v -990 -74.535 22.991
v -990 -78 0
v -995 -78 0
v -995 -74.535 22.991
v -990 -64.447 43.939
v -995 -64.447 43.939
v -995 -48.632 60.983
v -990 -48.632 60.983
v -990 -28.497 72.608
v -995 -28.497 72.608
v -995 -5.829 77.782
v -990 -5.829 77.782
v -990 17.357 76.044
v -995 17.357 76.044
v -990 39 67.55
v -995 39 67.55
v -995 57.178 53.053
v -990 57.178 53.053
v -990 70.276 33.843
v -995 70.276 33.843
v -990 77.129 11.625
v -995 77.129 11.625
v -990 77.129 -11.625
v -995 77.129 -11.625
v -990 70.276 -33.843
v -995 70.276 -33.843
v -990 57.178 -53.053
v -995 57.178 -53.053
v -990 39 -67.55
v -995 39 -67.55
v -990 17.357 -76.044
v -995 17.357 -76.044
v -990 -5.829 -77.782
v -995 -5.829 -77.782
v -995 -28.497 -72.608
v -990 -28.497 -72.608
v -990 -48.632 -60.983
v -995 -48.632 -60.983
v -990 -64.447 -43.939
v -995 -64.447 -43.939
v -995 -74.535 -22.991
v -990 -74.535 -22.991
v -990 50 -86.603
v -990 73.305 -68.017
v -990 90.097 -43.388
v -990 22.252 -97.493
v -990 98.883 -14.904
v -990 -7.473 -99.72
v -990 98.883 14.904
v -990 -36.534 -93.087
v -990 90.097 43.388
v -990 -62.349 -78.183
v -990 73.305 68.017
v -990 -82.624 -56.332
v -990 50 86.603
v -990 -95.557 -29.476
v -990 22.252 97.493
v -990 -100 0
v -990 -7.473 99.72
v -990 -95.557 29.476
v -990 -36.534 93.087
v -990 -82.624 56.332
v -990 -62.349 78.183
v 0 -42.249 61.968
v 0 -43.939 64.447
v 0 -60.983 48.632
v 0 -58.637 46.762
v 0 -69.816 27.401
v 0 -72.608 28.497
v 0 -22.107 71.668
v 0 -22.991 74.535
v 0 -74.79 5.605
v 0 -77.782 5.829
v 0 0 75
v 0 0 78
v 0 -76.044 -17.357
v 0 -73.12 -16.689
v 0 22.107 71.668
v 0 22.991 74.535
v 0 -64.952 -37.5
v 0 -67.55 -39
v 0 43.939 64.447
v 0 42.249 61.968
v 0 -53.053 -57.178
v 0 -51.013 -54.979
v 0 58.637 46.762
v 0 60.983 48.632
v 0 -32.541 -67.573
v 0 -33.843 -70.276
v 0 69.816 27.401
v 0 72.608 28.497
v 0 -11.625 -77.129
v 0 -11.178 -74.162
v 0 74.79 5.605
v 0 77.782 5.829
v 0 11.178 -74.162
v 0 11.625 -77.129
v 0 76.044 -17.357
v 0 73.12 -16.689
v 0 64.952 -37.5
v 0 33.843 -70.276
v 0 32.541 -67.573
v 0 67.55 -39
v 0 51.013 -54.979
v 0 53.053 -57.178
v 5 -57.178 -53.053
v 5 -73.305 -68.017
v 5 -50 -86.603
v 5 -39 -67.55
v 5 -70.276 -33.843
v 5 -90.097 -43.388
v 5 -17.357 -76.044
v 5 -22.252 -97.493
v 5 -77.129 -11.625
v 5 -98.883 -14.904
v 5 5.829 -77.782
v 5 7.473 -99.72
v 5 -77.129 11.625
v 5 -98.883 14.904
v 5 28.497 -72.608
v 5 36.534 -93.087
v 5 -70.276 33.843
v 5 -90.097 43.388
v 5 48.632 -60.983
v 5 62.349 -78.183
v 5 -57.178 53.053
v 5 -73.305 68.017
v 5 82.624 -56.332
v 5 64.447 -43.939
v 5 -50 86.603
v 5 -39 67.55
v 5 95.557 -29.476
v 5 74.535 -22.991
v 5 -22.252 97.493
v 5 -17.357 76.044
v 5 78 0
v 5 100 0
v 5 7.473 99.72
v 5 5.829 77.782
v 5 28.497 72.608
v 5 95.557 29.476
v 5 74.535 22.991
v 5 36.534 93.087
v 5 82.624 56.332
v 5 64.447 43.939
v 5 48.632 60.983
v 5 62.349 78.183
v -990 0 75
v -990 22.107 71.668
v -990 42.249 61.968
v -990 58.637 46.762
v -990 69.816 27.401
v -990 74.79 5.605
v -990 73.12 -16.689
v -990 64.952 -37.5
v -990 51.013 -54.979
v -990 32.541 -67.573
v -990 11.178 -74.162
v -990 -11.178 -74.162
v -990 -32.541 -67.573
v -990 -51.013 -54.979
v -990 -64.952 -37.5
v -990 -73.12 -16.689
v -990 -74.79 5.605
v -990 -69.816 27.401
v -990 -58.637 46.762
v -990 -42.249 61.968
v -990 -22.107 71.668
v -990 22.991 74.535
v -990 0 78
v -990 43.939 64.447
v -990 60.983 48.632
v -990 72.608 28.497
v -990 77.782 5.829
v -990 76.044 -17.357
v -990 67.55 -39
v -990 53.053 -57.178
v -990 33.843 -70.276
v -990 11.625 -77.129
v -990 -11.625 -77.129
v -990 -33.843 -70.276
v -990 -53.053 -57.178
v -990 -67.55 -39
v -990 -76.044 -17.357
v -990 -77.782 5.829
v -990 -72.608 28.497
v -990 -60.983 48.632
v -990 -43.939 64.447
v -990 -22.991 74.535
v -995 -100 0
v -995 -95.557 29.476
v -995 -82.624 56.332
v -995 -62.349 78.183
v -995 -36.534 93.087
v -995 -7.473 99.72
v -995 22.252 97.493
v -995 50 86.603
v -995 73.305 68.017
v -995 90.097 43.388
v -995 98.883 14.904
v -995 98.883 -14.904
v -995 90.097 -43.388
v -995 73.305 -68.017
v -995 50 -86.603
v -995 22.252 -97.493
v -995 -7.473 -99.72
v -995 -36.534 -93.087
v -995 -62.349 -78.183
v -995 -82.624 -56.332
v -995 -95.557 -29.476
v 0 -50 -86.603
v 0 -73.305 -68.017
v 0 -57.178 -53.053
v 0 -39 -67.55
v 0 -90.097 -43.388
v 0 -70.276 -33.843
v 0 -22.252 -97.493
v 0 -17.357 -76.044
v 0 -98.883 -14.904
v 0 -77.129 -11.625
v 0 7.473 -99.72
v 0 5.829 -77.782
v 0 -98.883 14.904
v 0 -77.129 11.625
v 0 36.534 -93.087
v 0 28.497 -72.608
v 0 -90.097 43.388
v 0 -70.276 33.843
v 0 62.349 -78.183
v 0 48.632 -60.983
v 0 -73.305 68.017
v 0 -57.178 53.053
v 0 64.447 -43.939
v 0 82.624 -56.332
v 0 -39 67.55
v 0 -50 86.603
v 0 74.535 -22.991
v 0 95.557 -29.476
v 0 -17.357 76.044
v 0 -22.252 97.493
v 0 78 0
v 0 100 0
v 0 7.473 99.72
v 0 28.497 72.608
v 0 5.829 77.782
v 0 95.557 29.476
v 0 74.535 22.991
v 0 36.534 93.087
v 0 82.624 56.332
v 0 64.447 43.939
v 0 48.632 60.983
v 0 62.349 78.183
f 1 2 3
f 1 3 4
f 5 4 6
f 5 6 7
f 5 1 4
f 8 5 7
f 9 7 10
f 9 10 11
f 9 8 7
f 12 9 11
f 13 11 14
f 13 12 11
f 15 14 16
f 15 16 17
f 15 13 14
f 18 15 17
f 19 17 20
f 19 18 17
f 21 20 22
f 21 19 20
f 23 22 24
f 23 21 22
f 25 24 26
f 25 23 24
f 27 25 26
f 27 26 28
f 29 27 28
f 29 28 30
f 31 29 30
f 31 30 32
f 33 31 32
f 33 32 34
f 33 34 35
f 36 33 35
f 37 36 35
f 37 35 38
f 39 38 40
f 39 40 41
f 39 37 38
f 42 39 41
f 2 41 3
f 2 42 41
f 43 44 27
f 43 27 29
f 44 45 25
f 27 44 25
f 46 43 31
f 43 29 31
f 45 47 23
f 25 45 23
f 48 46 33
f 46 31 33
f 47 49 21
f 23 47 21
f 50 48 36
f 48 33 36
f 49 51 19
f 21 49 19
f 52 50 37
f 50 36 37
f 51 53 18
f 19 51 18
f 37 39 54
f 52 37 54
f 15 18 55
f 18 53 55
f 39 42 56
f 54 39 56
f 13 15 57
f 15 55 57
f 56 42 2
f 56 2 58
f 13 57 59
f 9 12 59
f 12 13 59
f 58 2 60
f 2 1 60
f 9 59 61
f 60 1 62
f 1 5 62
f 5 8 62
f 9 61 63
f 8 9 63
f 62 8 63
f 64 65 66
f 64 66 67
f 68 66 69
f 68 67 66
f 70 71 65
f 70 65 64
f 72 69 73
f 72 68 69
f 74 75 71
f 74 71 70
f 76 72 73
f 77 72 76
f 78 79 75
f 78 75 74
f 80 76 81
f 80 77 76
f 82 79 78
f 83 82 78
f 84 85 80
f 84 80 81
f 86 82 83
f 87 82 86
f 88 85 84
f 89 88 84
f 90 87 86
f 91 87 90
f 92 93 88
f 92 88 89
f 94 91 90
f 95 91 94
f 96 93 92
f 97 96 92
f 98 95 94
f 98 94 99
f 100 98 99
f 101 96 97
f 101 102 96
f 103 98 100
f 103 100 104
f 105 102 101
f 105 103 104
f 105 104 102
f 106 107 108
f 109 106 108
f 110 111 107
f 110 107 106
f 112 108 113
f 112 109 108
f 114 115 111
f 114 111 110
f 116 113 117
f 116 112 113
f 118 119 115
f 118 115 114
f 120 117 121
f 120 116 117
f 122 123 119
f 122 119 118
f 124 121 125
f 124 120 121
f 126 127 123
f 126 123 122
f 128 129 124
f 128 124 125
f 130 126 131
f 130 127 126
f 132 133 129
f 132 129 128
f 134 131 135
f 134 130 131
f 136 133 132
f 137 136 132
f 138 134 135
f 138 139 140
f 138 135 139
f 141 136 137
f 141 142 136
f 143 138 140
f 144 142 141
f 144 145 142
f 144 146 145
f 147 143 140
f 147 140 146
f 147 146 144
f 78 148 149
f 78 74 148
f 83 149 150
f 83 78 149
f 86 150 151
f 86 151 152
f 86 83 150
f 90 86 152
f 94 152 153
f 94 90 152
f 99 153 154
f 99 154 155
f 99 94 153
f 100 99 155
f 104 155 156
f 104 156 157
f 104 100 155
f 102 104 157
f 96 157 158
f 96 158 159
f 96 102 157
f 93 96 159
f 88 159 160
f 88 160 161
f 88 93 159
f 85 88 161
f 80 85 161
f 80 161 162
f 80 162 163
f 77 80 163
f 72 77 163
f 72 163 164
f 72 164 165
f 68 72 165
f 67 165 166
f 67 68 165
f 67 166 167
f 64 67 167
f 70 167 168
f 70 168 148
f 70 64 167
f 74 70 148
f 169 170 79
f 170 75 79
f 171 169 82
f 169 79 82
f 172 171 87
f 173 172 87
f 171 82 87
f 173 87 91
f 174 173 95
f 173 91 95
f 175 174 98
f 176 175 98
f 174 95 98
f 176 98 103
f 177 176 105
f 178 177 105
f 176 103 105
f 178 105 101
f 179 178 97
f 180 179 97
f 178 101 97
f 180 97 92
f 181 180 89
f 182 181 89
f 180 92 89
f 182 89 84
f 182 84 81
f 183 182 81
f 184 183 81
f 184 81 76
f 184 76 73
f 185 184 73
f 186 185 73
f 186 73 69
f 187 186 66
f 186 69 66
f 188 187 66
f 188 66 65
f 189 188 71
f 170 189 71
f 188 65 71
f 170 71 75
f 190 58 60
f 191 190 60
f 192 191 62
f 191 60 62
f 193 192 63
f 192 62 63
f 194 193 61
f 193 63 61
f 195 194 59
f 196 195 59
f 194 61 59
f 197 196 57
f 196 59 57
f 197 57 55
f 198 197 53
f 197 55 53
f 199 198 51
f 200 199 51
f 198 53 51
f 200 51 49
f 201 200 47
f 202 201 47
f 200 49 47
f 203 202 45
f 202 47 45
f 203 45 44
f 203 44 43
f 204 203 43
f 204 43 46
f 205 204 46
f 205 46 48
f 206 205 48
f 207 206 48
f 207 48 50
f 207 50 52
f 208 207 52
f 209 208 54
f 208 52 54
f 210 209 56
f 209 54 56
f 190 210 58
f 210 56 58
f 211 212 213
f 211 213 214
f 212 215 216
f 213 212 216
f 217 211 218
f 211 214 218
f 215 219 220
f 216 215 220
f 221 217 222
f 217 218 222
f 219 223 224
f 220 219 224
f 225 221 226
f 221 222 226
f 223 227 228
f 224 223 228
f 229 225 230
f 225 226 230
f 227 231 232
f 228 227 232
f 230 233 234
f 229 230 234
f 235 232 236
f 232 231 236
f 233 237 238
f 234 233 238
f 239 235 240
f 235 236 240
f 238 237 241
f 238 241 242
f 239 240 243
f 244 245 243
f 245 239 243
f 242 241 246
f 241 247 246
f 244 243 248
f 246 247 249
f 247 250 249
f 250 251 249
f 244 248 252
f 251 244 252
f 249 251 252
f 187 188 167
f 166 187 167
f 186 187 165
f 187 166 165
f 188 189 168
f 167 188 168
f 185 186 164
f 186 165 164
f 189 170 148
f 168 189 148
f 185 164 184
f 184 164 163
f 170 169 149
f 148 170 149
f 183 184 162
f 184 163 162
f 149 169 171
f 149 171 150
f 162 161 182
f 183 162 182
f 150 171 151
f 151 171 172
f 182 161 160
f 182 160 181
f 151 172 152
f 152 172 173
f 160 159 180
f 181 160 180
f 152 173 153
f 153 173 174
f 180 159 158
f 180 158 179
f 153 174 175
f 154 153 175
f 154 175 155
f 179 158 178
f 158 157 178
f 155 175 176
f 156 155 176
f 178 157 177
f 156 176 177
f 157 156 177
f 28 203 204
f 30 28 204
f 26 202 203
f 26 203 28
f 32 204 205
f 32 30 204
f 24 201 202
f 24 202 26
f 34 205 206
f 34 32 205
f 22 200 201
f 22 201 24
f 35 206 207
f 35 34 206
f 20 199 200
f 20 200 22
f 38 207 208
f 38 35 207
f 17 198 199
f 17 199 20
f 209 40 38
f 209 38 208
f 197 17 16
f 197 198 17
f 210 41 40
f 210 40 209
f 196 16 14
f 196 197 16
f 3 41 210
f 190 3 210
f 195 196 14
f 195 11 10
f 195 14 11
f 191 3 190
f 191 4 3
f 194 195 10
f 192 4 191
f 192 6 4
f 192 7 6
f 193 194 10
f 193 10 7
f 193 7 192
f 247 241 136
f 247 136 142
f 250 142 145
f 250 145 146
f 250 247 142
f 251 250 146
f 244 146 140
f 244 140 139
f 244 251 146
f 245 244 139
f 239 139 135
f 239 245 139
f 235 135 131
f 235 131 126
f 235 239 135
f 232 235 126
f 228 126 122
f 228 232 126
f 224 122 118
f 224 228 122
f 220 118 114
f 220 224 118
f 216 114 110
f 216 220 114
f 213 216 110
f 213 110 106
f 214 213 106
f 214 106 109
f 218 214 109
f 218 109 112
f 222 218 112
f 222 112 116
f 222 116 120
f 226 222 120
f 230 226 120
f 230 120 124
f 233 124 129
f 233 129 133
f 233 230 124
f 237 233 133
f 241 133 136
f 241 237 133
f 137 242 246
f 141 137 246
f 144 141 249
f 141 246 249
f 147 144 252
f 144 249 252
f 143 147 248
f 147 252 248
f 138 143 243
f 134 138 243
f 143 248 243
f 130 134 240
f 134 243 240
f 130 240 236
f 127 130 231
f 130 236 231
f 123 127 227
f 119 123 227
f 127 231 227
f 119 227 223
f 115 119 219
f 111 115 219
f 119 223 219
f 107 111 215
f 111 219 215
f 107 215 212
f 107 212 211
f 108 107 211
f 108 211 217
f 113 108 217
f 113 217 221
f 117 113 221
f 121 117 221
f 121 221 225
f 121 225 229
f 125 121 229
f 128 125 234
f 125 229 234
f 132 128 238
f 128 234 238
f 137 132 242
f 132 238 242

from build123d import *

# Parameters (mm, degrees)
F0_W     = 990
F0_H     = 3
F2_R     = 100
F2_R_2   = 78
F3_DEPTH = 5
F4_R     = 100
F4_R_2   = 78
F5_DEPTH = 5


with BuildPart() as f1:
    # F0 (on Front) → F1 (revolve)
    with BuildSketch(Plane.XZ):
        with Locations((-495, 76.5)):
            Rectangle(F0_W, F0_H)
    revolve(axis=Axis((-495, 0, 0), (-1, 0, 0)))


with BuildPart() as f3:
    # F2 (on face) → F3 (new body)
    with BuildSketch(Plane(origin=(-990, 0, 0), x_dir=(0, -1, 0), z_dir=(-1, 0, 0))):
        Circle(F2_R)
        Circle(F2_R_2, mode=Mode.SUBTRACT)
    extrude(amount=F3_DEPTH)


with BuildPart() as f5:
    # F4 (on face) → F5 (new body)
    with BuildSketch(Plane.YZ):
        Circle(F4_R)
        Circle(F4_R_2, mode=Mode.SUBTRACT)
    extrude(amount=F5_DEPTH)


solid = Compound([f1.part, f3.part, f5.part])
